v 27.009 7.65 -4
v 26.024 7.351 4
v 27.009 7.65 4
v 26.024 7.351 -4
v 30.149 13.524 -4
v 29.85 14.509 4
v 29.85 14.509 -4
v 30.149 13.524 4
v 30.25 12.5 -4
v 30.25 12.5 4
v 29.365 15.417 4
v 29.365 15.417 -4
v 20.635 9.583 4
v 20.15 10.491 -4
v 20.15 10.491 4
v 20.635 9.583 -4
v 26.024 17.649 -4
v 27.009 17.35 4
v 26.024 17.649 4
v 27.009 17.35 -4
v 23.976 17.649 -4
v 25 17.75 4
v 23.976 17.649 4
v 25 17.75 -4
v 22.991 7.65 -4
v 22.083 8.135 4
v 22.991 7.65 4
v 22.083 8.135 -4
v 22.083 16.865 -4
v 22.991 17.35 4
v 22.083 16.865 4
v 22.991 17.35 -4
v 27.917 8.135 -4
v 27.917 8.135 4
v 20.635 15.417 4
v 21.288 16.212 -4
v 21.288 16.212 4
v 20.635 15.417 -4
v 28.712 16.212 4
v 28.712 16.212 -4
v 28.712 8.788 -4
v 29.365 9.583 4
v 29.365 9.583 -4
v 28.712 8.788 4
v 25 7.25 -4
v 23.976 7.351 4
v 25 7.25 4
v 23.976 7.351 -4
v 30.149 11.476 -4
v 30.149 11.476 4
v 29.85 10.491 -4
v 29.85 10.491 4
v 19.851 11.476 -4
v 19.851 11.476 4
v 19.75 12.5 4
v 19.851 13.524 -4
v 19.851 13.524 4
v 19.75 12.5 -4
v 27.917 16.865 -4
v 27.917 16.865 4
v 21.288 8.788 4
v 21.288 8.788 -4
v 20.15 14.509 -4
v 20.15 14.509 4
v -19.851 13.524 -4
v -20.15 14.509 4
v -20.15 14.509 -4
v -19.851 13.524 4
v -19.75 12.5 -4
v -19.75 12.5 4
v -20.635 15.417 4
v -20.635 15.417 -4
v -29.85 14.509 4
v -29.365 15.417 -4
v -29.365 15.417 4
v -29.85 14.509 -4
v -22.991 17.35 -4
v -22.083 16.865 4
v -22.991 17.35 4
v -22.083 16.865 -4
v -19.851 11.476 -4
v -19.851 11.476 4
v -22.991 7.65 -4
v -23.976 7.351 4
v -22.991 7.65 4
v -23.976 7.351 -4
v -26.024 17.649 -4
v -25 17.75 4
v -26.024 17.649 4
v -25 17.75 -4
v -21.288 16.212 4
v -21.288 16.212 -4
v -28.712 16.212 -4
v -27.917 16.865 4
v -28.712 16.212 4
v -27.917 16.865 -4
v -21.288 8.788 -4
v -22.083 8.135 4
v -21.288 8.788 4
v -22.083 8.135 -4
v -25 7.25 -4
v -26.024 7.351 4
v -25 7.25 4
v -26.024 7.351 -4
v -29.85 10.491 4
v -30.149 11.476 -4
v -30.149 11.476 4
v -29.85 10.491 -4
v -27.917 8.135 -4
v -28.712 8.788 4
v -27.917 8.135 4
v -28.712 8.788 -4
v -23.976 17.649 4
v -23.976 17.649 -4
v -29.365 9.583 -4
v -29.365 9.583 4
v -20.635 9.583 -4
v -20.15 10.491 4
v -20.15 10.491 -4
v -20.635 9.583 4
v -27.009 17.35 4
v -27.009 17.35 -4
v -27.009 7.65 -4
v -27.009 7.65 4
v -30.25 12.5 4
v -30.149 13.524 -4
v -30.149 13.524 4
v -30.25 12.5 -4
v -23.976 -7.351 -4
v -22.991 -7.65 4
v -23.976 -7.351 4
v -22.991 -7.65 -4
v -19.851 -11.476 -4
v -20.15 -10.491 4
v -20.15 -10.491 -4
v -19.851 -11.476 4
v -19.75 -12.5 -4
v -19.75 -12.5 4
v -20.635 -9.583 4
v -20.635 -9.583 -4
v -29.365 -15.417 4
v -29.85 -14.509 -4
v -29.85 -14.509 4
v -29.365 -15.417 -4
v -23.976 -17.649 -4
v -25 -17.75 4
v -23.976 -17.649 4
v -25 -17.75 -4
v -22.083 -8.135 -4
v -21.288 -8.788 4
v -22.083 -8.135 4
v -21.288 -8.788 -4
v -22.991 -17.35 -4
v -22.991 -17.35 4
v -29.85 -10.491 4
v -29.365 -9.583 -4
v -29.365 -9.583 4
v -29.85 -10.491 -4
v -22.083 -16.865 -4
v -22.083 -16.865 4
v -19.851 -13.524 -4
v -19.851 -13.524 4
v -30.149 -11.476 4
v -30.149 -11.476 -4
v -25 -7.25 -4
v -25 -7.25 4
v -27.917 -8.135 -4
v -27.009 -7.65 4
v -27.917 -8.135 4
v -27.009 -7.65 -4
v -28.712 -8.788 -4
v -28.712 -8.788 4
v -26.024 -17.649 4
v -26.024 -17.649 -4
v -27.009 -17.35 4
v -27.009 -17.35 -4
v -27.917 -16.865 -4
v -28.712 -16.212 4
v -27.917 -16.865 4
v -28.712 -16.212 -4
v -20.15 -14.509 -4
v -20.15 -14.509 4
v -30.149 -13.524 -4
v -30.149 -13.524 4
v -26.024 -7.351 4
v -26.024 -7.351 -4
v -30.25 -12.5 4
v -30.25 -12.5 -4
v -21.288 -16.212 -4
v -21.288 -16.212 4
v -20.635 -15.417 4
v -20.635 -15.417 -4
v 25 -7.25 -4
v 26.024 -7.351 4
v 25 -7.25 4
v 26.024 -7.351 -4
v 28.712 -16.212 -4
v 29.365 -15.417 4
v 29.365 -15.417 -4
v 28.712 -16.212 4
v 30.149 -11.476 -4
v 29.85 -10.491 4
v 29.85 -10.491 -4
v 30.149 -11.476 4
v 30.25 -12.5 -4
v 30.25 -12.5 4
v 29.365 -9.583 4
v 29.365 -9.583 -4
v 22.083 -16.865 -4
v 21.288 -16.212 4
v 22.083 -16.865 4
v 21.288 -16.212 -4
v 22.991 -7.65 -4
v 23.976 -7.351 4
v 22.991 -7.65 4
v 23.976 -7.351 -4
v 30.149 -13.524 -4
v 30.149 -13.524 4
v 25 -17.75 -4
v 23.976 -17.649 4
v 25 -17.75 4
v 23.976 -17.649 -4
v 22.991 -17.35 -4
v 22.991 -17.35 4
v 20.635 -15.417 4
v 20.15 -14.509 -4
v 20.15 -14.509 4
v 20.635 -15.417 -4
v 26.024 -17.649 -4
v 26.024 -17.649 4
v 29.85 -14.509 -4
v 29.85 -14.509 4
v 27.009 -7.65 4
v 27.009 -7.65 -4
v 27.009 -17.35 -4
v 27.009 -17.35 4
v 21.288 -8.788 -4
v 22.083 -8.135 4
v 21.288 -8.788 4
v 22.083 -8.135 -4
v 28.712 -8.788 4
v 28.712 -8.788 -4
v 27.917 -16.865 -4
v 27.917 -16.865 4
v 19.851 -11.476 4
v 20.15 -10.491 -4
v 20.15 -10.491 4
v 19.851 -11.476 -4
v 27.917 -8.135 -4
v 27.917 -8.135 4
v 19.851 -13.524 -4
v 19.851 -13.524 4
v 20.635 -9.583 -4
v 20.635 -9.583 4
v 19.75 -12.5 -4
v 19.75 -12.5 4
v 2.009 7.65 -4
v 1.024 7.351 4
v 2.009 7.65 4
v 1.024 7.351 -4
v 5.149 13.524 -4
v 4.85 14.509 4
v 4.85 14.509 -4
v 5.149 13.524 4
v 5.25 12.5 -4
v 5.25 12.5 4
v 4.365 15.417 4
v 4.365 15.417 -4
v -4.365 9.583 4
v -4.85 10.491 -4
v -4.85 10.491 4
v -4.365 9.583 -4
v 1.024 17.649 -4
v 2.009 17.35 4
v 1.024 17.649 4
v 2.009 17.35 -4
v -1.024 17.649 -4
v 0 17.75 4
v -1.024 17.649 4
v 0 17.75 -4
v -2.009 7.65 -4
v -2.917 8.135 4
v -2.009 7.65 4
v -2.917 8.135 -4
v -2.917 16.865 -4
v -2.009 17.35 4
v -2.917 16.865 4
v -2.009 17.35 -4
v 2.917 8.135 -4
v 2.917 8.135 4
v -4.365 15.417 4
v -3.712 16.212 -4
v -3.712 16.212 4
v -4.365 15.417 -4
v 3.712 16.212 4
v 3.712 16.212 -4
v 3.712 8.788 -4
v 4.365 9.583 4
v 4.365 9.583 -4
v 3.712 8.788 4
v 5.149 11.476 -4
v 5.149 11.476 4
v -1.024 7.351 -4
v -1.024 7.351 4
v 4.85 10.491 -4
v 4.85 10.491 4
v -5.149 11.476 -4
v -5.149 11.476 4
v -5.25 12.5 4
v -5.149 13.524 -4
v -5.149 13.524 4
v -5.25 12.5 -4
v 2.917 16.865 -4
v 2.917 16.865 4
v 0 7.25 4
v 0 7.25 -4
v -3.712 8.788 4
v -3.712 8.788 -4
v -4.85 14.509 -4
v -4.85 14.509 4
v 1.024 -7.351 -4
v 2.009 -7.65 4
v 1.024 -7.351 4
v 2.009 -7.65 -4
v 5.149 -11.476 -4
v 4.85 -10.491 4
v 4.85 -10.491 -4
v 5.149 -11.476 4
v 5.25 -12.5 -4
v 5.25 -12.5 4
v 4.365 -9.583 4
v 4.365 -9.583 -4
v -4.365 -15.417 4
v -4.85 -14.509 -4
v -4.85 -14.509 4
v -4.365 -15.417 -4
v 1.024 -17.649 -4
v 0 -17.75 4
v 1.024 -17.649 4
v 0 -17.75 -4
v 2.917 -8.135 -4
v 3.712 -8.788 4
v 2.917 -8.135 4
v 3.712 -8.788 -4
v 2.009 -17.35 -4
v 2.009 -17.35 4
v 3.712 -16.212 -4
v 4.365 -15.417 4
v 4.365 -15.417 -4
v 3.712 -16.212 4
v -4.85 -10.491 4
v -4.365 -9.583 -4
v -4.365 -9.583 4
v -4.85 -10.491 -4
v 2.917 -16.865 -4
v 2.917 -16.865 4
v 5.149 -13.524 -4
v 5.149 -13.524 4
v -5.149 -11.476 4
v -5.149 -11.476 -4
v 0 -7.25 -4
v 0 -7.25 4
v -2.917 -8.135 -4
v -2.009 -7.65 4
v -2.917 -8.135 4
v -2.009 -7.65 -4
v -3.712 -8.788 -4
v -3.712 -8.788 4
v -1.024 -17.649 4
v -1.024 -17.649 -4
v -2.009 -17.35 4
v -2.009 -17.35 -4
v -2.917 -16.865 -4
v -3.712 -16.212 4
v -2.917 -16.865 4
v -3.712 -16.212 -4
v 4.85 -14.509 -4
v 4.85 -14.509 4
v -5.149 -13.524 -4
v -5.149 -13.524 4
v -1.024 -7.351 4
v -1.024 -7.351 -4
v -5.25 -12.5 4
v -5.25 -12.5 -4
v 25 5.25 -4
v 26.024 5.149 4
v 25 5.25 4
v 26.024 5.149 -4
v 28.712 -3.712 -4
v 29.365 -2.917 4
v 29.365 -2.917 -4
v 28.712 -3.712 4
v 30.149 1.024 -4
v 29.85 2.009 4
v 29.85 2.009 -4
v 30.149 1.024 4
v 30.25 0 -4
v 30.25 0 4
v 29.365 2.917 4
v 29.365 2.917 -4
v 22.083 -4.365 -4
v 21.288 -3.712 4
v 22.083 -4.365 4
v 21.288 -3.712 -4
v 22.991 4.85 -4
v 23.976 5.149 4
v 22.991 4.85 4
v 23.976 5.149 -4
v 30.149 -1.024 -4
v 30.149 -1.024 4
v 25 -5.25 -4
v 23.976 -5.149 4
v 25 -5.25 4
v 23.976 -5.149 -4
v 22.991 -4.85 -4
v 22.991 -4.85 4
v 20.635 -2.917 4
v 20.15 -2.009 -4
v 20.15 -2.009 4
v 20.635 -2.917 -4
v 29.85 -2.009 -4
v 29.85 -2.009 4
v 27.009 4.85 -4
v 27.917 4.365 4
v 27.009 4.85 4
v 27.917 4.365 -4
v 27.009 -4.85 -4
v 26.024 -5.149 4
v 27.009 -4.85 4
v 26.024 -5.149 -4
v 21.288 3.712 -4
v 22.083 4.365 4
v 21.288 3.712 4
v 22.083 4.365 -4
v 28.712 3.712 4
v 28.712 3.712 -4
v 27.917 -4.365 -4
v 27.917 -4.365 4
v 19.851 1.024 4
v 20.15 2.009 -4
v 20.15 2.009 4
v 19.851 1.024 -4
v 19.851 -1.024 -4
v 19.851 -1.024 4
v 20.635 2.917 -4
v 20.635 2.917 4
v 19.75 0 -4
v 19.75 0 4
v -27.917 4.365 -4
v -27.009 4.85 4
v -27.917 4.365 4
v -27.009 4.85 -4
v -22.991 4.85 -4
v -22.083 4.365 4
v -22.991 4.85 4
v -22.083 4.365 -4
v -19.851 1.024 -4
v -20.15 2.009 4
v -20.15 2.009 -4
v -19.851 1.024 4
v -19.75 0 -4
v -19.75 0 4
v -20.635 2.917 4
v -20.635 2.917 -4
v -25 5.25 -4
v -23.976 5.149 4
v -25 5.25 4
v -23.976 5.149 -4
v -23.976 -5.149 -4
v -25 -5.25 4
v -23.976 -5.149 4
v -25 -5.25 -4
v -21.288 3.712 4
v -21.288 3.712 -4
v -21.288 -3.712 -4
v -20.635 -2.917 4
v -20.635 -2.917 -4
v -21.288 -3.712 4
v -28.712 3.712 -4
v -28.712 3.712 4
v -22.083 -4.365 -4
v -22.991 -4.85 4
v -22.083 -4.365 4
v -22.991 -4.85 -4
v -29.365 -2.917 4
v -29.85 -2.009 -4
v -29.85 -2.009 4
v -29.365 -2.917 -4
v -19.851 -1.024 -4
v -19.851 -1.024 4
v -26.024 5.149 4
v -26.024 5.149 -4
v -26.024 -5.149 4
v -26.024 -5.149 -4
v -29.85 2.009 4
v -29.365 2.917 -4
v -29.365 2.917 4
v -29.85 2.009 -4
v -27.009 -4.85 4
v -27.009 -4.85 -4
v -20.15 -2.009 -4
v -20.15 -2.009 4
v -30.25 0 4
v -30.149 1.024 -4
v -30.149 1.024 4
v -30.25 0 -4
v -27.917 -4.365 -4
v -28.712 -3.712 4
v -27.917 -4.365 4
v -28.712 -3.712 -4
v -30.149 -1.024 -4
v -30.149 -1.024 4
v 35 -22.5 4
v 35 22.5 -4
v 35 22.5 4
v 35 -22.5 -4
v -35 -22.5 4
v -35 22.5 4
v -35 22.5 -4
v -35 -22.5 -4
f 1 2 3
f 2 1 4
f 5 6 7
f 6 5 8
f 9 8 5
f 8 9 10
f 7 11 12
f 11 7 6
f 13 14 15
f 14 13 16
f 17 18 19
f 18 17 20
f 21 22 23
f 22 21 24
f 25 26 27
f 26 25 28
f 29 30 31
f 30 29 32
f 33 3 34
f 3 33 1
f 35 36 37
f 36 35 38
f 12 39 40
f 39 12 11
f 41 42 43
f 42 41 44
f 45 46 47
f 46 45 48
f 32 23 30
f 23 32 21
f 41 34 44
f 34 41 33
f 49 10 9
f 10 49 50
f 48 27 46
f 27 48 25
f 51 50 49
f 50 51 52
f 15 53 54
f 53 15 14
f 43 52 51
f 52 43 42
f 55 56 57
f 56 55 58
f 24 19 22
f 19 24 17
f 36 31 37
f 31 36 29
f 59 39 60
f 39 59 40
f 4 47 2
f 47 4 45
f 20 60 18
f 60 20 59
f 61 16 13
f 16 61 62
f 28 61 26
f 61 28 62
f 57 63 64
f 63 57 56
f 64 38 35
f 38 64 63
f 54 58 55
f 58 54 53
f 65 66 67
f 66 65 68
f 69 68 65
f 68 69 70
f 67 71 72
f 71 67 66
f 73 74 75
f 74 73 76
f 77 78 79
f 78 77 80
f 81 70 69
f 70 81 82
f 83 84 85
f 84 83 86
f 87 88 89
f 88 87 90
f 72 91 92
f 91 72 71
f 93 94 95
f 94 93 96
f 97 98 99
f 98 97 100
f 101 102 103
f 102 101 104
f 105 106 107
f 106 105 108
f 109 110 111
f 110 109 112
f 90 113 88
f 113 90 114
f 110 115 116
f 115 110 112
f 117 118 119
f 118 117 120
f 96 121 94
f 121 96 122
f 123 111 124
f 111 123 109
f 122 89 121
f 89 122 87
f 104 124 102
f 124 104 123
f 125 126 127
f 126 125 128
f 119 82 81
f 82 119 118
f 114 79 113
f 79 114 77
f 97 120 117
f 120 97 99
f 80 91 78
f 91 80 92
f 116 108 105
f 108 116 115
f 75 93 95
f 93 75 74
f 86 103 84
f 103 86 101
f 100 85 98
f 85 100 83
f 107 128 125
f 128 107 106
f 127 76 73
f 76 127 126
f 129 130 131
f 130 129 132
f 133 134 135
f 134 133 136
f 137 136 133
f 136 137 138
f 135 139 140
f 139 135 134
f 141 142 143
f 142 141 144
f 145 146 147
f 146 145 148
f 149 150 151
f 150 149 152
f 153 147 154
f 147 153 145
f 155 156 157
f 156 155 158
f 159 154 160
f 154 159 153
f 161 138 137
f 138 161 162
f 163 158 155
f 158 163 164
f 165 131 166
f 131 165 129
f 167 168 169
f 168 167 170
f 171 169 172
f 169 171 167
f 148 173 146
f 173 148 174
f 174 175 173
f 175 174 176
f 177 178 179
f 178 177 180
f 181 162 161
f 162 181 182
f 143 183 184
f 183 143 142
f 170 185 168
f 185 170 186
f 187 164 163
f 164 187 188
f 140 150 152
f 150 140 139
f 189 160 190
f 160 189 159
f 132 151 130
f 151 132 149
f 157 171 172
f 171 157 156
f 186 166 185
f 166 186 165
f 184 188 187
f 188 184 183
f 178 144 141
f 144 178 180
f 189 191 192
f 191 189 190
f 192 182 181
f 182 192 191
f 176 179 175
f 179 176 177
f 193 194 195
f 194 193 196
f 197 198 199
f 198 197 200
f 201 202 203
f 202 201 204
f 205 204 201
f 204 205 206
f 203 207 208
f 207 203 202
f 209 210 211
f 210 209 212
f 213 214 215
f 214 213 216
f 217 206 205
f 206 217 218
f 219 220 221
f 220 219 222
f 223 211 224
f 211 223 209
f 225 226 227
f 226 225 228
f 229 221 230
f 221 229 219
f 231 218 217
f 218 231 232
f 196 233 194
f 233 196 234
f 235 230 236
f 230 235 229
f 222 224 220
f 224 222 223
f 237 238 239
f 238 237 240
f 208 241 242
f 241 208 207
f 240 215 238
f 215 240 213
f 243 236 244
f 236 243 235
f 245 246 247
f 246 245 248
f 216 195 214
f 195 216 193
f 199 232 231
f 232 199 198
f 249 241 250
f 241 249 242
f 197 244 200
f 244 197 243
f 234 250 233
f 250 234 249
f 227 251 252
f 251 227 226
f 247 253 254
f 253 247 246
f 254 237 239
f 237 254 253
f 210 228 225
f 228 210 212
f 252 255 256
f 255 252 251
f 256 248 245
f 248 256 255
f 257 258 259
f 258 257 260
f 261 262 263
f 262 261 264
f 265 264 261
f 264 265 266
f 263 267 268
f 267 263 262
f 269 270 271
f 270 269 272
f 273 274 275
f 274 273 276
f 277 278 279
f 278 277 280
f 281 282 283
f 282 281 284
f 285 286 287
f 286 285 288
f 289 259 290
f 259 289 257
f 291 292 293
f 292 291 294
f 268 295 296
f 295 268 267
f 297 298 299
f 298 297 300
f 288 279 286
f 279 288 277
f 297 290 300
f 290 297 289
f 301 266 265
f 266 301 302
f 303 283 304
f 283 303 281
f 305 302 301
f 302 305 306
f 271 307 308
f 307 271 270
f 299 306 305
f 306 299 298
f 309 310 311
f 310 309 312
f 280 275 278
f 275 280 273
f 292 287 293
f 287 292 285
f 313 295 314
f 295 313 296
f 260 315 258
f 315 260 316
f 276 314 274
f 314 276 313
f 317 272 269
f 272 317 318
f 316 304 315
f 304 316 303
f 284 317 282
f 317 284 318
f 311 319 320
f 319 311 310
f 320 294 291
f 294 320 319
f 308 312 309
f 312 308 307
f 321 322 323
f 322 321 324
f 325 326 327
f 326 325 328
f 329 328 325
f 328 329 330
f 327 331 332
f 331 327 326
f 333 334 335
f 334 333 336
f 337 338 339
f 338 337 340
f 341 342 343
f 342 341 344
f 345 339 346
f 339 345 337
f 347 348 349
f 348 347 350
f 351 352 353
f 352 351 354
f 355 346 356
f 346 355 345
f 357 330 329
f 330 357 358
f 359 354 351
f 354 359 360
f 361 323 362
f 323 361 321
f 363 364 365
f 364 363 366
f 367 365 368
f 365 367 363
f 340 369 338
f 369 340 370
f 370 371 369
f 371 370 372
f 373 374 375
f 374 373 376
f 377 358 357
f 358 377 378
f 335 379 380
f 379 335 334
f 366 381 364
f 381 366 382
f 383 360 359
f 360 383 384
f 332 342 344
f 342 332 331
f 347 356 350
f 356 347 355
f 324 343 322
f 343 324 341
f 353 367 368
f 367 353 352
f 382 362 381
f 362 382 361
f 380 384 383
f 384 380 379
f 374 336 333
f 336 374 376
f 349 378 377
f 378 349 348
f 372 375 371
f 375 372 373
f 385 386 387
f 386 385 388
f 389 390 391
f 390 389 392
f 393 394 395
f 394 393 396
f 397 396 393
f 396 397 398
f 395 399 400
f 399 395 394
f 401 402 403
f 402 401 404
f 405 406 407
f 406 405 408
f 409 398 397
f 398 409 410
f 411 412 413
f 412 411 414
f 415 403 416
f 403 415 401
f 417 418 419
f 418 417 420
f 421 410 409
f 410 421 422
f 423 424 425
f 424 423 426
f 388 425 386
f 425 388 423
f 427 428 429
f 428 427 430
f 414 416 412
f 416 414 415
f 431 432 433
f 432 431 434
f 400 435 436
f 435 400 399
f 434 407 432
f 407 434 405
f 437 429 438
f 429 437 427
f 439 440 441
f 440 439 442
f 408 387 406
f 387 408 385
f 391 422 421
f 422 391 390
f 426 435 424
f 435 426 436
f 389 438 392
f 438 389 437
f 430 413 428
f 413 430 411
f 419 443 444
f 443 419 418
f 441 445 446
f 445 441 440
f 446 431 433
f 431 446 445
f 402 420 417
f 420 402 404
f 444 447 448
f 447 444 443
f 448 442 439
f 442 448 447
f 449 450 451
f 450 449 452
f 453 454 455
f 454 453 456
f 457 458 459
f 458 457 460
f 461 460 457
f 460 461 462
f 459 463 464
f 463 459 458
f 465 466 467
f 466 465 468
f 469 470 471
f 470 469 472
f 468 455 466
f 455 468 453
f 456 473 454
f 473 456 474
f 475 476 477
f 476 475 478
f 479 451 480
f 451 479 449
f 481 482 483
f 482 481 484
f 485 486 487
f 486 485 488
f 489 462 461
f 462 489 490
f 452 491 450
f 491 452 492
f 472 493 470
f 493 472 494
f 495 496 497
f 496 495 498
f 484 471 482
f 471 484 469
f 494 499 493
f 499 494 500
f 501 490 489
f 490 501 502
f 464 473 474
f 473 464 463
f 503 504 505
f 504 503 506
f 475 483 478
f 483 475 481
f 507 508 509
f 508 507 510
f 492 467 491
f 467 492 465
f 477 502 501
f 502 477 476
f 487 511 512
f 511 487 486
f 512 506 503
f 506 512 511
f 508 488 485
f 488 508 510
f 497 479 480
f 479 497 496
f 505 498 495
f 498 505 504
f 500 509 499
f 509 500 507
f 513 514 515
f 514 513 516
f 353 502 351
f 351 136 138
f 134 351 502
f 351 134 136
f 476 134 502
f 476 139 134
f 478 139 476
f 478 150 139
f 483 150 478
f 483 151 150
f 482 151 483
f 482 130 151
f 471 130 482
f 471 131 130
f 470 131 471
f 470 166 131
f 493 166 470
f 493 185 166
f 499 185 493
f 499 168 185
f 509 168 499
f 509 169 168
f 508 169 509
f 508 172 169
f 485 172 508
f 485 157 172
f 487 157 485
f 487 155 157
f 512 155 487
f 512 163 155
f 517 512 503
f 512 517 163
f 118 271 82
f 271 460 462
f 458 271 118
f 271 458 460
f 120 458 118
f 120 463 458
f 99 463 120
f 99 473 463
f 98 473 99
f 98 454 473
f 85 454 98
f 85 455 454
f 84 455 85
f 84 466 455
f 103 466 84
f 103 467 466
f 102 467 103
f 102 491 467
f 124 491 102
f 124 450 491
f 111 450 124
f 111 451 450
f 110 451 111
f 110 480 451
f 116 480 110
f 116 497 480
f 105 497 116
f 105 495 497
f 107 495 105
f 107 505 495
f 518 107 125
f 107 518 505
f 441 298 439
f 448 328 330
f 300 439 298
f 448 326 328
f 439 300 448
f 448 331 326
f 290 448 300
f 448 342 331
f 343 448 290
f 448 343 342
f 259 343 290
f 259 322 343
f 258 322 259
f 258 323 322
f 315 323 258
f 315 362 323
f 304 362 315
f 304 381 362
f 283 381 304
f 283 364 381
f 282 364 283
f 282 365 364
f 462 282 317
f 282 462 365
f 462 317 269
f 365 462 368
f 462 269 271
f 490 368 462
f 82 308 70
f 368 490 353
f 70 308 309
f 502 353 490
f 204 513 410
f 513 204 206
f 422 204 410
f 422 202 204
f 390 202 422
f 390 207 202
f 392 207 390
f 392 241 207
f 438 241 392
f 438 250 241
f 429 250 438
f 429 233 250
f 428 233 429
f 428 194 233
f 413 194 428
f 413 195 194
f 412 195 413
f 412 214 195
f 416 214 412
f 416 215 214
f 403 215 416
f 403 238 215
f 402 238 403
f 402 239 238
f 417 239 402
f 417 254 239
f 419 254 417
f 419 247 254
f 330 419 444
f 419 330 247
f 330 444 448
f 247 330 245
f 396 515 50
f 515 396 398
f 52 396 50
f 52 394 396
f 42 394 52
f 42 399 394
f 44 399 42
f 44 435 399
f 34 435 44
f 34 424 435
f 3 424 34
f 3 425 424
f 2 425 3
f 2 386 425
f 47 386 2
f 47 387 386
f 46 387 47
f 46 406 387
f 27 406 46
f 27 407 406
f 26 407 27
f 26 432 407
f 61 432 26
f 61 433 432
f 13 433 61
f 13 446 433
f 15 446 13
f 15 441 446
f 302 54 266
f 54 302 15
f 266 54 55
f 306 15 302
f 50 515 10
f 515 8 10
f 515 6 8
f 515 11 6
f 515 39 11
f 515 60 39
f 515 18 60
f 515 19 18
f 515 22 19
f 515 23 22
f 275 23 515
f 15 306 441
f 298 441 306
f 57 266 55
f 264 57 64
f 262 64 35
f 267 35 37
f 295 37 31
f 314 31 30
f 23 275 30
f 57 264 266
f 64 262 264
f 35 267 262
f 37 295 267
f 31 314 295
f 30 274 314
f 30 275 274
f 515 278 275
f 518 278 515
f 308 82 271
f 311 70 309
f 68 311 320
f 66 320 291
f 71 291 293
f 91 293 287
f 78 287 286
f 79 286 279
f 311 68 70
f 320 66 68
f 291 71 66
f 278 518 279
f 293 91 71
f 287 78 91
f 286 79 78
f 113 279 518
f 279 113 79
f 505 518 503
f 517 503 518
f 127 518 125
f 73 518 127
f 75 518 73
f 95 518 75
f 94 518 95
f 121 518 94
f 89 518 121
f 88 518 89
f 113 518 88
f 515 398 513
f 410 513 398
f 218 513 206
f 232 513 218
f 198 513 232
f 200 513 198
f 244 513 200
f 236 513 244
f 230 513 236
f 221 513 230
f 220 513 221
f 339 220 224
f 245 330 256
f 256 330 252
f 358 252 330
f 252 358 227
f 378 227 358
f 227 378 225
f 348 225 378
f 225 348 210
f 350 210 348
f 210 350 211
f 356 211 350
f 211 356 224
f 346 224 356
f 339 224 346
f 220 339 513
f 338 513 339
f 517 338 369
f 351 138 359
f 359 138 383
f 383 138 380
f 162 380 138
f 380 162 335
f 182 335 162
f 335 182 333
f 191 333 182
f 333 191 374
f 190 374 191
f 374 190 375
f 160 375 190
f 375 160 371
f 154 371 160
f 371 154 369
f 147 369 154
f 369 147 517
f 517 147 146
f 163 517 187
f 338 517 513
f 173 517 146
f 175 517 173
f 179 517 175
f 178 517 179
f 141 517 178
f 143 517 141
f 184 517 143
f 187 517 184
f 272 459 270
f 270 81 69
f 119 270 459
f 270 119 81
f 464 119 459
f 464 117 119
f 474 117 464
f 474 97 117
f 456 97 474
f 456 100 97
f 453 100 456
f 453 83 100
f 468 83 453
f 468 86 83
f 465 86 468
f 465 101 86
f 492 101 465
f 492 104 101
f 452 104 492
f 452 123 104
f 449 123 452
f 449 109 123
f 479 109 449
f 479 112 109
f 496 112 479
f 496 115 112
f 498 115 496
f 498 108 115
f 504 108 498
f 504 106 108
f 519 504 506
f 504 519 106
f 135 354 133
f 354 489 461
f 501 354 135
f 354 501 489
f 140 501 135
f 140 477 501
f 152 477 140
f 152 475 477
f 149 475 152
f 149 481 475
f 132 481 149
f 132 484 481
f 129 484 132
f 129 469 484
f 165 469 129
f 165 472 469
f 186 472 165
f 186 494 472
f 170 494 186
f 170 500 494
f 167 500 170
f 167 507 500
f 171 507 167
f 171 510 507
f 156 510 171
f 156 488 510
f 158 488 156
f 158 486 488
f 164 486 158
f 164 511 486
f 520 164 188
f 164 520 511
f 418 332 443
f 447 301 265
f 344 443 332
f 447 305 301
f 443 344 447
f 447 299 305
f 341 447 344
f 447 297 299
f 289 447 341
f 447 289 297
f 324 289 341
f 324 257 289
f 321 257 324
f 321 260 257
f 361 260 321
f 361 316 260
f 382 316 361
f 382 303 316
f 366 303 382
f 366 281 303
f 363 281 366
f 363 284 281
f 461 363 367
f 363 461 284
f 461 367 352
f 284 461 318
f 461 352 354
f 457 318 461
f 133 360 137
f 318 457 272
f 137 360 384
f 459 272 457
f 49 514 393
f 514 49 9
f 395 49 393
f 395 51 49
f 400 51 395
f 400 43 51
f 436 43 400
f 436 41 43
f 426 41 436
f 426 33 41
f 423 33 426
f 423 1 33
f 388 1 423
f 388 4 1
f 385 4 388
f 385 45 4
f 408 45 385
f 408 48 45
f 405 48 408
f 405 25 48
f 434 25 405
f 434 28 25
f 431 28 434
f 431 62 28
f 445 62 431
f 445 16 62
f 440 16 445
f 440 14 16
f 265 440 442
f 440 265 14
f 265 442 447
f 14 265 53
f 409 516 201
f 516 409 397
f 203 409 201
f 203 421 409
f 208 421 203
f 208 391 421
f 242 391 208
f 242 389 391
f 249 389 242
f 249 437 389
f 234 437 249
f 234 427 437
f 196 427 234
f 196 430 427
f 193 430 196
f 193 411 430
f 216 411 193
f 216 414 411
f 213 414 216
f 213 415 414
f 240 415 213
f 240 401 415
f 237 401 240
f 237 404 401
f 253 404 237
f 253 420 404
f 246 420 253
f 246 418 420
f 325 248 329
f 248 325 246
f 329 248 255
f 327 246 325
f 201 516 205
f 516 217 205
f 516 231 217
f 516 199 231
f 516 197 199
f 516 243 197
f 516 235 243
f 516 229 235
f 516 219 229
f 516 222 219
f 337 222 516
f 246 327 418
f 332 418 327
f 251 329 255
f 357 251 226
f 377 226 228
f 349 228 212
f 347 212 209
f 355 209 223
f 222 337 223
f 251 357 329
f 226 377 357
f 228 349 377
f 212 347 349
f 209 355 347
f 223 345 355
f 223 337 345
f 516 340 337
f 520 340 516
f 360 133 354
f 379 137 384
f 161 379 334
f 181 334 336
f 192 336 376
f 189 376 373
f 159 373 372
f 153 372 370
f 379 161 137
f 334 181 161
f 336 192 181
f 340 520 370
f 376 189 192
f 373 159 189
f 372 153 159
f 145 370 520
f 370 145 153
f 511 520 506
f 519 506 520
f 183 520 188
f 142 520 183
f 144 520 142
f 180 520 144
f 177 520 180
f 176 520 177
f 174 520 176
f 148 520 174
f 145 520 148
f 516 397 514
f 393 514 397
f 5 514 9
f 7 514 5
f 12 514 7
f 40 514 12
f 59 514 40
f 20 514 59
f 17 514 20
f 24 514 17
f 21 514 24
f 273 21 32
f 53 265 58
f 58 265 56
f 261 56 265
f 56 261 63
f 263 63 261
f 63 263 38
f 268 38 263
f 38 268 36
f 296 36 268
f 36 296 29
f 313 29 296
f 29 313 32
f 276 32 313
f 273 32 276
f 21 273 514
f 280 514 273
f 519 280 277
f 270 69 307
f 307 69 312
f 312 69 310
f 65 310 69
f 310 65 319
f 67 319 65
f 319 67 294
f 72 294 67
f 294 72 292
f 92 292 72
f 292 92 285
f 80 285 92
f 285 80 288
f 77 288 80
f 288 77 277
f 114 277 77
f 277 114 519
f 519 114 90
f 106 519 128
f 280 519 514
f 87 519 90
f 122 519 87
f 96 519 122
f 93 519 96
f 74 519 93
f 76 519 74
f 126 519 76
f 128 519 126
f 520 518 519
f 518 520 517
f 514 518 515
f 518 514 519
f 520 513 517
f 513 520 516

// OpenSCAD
$fn = 32;

// ----------------------------------------------------------------------
// Corner plate 70 x 45 x 8
// 8 holes, centres taken from the edge offset
// ----------------------------------------------------------------------

// --- parameters (mm) ---
plate = [70, 45, 8];  // overall size (x, y, z)
holes = 8;            // number of holes the drawing asks for
hole_d = 10.5;        // hole diameter
edge = 10;            // hole centre offset from the plate edge

// --- derived feature positions (mm) ---
corner_x = plate[0] / 2 - edge;  // = 25   corner hole X
corner_y = plate[1] / 2 - edge;  // = 12.5   corner hole Y
feature_centers = [
  [corner_x, corner_y],
  [-corner_x, corner_y],
  [-corner_x, -corner_y],
  [corner_x, -corner_y],
  [0, corner_y],
  [0, -corner_y],
  [corner_x, 0],
  [-corner_x, 0]
];   // hole centres the loop below drills

// plate outline, every hole drilled through with the same cutters
difference() {
  cube(plate, center = true);
  for (centre = feature_centers)
    translate([centre[0], centre[1], 0])
      cylinder(d = hole_d, h = plate[2] + 2, center = true);
}
